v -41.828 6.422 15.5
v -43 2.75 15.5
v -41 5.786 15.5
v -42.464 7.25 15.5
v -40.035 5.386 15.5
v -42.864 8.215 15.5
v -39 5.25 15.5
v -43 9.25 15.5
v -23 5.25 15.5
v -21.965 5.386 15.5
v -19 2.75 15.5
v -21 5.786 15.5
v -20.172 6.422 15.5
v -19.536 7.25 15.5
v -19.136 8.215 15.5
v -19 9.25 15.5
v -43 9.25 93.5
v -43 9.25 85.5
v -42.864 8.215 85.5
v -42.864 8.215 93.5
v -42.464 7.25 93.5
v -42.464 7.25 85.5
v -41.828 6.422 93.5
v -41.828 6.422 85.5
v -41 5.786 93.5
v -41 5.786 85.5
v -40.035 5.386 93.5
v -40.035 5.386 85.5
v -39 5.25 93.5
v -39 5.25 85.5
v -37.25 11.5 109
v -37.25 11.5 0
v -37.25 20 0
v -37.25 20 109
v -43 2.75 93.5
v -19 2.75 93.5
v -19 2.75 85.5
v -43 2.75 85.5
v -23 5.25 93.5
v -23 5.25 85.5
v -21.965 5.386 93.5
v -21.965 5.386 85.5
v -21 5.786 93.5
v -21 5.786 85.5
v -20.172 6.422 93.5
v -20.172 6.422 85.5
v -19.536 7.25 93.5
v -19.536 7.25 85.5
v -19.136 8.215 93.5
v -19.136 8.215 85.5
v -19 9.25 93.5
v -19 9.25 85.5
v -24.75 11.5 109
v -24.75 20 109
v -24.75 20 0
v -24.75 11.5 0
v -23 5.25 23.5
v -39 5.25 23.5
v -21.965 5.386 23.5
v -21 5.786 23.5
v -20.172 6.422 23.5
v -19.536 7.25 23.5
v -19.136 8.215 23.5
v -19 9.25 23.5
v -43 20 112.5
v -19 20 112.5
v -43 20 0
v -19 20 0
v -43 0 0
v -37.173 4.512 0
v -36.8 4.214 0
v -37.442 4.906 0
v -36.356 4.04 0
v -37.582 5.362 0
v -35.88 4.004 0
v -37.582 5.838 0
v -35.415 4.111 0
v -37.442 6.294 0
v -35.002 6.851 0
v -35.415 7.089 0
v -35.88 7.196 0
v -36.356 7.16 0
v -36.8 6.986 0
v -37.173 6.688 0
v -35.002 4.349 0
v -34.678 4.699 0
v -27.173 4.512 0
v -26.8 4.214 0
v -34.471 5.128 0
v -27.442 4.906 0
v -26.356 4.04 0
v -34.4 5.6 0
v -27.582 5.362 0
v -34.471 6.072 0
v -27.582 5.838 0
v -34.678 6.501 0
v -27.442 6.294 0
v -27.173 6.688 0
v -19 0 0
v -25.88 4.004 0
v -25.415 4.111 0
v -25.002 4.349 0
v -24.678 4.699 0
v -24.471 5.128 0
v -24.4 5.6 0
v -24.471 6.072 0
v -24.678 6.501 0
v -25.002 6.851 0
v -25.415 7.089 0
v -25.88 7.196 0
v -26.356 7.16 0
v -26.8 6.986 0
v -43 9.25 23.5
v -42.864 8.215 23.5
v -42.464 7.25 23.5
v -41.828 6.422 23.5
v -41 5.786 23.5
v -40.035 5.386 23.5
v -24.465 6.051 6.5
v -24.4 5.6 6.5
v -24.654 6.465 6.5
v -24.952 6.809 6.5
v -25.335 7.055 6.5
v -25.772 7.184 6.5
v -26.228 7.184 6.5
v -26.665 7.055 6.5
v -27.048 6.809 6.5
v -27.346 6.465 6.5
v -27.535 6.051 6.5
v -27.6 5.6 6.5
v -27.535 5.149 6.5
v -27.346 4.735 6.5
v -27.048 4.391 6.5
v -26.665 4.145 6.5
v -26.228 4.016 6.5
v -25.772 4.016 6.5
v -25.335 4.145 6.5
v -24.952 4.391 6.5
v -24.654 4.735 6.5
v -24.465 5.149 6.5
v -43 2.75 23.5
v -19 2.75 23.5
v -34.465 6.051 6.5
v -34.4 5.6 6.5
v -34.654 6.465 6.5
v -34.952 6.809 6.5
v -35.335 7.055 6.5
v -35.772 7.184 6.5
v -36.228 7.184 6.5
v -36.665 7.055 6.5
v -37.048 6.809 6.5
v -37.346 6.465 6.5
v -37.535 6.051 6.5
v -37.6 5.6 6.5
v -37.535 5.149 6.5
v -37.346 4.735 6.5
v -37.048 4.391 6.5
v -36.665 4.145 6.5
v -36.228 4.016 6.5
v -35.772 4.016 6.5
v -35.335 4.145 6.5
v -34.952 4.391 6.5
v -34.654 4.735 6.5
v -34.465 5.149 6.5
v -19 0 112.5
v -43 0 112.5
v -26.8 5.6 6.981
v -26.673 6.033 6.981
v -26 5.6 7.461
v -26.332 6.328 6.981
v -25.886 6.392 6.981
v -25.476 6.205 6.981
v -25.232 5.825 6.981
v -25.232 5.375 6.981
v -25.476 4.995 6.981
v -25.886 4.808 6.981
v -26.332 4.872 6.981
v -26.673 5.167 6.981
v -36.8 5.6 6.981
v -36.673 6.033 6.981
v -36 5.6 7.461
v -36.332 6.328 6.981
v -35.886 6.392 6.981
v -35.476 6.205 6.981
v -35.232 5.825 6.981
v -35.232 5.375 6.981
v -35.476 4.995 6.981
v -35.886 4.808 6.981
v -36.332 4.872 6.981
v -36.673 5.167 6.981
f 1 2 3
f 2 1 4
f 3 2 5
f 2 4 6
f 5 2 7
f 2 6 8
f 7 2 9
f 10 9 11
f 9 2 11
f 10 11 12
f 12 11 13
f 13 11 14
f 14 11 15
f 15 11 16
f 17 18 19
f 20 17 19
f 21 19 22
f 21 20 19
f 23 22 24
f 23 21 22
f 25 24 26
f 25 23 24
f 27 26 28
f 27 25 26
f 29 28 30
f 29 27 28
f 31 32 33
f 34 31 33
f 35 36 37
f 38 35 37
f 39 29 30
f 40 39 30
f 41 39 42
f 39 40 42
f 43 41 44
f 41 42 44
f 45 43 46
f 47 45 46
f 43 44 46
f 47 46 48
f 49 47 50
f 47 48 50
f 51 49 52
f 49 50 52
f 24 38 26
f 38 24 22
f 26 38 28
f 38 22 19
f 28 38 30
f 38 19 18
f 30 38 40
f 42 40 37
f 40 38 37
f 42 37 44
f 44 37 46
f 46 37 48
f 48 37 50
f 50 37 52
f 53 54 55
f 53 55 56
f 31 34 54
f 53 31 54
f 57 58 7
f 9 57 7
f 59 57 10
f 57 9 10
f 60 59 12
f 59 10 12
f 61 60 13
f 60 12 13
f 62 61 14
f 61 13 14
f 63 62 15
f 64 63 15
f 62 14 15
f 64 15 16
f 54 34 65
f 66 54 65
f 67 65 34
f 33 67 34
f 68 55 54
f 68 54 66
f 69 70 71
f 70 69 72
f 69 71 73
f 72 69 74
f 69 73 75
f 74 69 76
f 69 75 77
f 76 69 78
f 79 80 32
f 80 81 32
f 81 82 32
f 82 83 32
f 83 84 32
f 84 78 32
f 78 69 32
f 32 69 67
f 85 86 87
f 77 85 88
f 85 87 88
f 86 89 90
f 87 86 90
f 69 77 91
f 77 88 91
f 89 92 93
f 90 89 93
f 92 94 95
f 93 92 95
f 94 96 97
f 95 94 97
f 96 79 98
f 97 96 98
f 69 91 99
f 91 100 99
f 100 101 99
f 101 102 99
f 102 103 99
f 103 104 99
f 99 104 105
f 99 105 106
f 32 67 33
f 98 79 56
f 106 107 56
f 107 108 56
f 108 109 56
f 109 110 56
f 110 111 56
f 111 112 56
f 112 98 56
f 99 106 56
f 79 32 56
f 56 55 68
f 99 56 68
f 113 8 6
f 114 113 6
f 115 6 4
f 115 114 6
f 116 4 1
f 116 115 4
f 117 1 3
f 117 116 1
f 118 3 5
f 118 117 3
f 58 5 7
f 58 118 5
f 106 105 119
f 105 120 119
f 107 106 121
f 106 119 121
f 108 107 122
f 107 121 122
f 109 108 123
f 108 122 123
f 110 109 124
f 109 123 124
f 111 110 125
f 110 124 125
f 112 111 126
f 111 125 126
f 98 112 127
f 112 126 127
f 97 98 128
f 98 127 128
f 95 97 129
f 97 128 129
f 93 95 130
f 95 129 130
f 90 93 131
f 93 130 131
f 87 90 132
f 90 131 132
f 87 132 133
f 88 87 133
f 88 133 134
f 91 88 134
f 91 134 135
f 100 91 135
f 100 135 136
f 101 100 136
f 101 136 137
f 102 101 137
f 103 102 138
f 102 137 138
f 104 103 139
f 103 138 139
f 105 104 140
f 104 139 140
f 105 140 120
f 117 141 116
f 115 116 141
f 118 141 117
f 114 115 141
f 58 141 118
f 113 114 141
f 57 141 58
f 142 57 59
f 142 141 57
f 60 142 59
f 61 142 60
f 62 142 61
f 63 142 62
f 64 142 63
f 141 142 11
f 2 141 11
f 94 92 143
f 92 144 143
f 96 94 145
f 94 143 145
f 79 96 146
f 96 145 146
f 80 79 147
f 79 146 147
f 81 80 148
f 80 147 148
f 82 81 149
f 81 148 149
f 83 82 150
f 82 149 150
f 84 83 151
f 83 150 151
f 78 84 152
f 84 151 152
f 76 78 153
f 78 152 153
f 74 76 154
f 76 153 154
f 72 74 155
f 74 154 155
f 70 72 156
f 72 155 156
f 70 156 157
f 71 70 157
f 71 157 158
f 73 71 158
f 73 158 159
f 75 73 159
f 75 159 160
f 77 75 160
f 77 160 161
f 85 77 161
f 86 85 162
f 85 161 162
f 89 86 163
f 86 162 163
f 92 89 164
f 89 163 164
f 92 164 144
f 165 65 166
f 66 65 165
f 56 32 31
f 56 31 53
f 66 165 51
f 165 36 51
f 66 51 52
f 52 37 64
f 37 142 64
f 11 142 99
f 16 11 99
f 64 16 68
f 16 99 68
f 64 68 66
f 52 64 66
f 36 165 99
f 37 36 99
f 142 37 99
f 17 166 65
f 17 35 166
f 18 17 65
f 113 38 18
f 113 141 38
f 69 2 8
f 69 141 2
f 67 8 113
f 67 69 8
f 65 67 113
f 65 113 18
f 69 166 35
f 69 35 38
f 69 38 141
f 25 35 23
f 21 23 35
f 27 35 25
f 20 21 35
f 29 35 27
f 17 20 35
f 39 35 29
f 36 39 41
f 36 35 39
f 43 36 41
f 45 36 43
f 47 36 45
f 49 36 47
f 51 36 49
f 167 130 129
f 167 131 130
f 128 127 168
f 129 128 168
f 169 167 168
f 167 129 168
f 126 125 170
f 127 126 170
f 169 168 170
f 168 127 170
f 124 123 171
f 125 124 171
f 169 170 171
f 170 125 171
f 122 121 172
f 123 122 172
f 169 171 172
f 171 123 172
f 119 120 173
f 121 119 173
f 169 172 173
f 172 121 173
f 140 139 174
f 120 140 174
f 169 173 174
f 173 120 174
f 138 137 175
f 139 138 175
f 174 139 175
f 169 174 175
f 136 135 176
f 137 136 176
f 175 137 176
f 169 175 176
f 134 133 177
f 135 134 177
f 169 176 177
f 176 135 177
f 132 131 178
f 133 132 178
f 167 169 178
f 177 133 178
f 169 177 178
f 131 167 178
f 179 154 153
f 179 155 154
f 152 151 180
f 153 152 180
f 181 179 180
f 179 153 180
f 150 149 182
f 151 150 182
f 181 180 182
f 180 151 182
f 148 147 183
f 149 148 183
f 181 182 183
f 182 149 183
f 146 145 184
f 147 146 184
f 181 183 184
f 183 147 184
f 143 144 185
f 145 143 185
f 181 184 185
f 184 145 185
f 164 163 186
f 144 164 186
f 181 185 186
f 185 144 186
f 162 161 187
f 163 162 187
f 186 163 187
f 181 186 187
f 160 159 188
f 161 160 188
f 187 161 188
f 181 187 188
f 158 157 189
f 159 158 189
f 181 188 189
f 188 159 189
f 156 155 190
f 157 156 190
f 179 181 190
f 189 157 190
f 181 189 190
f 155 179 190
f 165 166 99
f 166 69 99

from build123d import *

# Parameters (mm, degrees)
SKETCH1_W                 = 12.5
SKETCH1_H                 = 11.5
BOSS_EXTRUDE1_DEPTH       = 109
SKETCH2_W                 = 24
SKETCH2_H                 = 20
BOSS_EXTRUDE2_DEPTH       = 3.5
F_2_5MM_DOWEL_HOLE1_D     = 3.2
F_2_5MM_DOWEL_HOLE1_DEPTH = 6.5
F_2_5MM_DOWEL_HOLE1_TIP   = 0.96137699
SKETCH5_W                 = 8
SKETCH5_H                 = 2.5
CUT_EXTRUDE1_DEPTH        = 117.757226757
FILLET1_R                 = 4


with BuildPart() as part:
    # Sketch1 → Boss-Extrude1 (new body)
    with BuildSketch(Plane.XY):
        Polygon((-37.25, 0), (-37.25, 11.5), (-37.25, 20), (-43, 20), (-43, 0), align=None)
        with Locations((-31, 5.75)):
            Rectangle(SKETCH1_W, SKETCH1_H)
        Polygon((-24.75, 20), (-24.75, 11.5), (-24.75, 0), (-19, 0), (-19, 20), align=None)
    extrude(amount=BOSS_EXTRUDE1_DEPTH)

    # Sketch2 → Boss-Extrude2 (add)
    with BuildSketch(Plane.XY.offset(109)):
        with Locations((-31, 10)):
            Rectangle(SKETCH2_W, SKETCH2_H)
    extrude(amount=BOSS_EXTRUDE2_DEPTH)

    # Ø2.5mm Dowel Hole1
    with Locations(Plane(origin=(0, 0, 0), x_dir=(-1, 0, 0), z_dir=(0, 0, -1))):
        with Locations((36, 5.6), (26, 5.6)):
            Hole(F_2_5MM_DOWEL_HOLE1_D / 2, depth=F_2_5MM_DOWEL_HOLE1_DEPTH)
            with Locations((0, 0, -(F_2_5MM_DOWEL_HOLE1_DEPTH + F_2_5MM_DOWEL_HOLE1_TIP / 2))):  # 118° drill point
                Cone(0, F_2_5MM_DOWEL_HOLE1_D / 2, F_2_5MM_DOWEL_HOLE1_TIP, mode=Mode.SUBTRACT)

    # Sketch5 → Cut-Extrude1 (cut, through all)
    with BuildSketch(Plane(origin=(-19, 0, 0), x_dir=(0, 0, -1), z_dir=(1, 0, 0))):
        with Locations((-89.5, 4)):
            Rectangle(SKETCH5_W, SKETCH5_H)
        with Locations((-19.5, 4)):
            Rectangle(SKETCH5_W, SKETCH5_H)
    extrude(amount=-CUT_EXTRUDE1_DEPTH, mode=Mode.SUBTRACT)

    # Fillet1
    fillet1_edges = [part.edges().sort_by_distance(p)[0] for p in [
        (-43, 5.25, 89.5),
        (-19, 5.25, 89.5),
        (-43, 5.25, 19.5),
        (-19, 5.25, 19.5),
    ]]
    fillet(fillet1_edges, radius=FILLET1_R)


solid = part.part
